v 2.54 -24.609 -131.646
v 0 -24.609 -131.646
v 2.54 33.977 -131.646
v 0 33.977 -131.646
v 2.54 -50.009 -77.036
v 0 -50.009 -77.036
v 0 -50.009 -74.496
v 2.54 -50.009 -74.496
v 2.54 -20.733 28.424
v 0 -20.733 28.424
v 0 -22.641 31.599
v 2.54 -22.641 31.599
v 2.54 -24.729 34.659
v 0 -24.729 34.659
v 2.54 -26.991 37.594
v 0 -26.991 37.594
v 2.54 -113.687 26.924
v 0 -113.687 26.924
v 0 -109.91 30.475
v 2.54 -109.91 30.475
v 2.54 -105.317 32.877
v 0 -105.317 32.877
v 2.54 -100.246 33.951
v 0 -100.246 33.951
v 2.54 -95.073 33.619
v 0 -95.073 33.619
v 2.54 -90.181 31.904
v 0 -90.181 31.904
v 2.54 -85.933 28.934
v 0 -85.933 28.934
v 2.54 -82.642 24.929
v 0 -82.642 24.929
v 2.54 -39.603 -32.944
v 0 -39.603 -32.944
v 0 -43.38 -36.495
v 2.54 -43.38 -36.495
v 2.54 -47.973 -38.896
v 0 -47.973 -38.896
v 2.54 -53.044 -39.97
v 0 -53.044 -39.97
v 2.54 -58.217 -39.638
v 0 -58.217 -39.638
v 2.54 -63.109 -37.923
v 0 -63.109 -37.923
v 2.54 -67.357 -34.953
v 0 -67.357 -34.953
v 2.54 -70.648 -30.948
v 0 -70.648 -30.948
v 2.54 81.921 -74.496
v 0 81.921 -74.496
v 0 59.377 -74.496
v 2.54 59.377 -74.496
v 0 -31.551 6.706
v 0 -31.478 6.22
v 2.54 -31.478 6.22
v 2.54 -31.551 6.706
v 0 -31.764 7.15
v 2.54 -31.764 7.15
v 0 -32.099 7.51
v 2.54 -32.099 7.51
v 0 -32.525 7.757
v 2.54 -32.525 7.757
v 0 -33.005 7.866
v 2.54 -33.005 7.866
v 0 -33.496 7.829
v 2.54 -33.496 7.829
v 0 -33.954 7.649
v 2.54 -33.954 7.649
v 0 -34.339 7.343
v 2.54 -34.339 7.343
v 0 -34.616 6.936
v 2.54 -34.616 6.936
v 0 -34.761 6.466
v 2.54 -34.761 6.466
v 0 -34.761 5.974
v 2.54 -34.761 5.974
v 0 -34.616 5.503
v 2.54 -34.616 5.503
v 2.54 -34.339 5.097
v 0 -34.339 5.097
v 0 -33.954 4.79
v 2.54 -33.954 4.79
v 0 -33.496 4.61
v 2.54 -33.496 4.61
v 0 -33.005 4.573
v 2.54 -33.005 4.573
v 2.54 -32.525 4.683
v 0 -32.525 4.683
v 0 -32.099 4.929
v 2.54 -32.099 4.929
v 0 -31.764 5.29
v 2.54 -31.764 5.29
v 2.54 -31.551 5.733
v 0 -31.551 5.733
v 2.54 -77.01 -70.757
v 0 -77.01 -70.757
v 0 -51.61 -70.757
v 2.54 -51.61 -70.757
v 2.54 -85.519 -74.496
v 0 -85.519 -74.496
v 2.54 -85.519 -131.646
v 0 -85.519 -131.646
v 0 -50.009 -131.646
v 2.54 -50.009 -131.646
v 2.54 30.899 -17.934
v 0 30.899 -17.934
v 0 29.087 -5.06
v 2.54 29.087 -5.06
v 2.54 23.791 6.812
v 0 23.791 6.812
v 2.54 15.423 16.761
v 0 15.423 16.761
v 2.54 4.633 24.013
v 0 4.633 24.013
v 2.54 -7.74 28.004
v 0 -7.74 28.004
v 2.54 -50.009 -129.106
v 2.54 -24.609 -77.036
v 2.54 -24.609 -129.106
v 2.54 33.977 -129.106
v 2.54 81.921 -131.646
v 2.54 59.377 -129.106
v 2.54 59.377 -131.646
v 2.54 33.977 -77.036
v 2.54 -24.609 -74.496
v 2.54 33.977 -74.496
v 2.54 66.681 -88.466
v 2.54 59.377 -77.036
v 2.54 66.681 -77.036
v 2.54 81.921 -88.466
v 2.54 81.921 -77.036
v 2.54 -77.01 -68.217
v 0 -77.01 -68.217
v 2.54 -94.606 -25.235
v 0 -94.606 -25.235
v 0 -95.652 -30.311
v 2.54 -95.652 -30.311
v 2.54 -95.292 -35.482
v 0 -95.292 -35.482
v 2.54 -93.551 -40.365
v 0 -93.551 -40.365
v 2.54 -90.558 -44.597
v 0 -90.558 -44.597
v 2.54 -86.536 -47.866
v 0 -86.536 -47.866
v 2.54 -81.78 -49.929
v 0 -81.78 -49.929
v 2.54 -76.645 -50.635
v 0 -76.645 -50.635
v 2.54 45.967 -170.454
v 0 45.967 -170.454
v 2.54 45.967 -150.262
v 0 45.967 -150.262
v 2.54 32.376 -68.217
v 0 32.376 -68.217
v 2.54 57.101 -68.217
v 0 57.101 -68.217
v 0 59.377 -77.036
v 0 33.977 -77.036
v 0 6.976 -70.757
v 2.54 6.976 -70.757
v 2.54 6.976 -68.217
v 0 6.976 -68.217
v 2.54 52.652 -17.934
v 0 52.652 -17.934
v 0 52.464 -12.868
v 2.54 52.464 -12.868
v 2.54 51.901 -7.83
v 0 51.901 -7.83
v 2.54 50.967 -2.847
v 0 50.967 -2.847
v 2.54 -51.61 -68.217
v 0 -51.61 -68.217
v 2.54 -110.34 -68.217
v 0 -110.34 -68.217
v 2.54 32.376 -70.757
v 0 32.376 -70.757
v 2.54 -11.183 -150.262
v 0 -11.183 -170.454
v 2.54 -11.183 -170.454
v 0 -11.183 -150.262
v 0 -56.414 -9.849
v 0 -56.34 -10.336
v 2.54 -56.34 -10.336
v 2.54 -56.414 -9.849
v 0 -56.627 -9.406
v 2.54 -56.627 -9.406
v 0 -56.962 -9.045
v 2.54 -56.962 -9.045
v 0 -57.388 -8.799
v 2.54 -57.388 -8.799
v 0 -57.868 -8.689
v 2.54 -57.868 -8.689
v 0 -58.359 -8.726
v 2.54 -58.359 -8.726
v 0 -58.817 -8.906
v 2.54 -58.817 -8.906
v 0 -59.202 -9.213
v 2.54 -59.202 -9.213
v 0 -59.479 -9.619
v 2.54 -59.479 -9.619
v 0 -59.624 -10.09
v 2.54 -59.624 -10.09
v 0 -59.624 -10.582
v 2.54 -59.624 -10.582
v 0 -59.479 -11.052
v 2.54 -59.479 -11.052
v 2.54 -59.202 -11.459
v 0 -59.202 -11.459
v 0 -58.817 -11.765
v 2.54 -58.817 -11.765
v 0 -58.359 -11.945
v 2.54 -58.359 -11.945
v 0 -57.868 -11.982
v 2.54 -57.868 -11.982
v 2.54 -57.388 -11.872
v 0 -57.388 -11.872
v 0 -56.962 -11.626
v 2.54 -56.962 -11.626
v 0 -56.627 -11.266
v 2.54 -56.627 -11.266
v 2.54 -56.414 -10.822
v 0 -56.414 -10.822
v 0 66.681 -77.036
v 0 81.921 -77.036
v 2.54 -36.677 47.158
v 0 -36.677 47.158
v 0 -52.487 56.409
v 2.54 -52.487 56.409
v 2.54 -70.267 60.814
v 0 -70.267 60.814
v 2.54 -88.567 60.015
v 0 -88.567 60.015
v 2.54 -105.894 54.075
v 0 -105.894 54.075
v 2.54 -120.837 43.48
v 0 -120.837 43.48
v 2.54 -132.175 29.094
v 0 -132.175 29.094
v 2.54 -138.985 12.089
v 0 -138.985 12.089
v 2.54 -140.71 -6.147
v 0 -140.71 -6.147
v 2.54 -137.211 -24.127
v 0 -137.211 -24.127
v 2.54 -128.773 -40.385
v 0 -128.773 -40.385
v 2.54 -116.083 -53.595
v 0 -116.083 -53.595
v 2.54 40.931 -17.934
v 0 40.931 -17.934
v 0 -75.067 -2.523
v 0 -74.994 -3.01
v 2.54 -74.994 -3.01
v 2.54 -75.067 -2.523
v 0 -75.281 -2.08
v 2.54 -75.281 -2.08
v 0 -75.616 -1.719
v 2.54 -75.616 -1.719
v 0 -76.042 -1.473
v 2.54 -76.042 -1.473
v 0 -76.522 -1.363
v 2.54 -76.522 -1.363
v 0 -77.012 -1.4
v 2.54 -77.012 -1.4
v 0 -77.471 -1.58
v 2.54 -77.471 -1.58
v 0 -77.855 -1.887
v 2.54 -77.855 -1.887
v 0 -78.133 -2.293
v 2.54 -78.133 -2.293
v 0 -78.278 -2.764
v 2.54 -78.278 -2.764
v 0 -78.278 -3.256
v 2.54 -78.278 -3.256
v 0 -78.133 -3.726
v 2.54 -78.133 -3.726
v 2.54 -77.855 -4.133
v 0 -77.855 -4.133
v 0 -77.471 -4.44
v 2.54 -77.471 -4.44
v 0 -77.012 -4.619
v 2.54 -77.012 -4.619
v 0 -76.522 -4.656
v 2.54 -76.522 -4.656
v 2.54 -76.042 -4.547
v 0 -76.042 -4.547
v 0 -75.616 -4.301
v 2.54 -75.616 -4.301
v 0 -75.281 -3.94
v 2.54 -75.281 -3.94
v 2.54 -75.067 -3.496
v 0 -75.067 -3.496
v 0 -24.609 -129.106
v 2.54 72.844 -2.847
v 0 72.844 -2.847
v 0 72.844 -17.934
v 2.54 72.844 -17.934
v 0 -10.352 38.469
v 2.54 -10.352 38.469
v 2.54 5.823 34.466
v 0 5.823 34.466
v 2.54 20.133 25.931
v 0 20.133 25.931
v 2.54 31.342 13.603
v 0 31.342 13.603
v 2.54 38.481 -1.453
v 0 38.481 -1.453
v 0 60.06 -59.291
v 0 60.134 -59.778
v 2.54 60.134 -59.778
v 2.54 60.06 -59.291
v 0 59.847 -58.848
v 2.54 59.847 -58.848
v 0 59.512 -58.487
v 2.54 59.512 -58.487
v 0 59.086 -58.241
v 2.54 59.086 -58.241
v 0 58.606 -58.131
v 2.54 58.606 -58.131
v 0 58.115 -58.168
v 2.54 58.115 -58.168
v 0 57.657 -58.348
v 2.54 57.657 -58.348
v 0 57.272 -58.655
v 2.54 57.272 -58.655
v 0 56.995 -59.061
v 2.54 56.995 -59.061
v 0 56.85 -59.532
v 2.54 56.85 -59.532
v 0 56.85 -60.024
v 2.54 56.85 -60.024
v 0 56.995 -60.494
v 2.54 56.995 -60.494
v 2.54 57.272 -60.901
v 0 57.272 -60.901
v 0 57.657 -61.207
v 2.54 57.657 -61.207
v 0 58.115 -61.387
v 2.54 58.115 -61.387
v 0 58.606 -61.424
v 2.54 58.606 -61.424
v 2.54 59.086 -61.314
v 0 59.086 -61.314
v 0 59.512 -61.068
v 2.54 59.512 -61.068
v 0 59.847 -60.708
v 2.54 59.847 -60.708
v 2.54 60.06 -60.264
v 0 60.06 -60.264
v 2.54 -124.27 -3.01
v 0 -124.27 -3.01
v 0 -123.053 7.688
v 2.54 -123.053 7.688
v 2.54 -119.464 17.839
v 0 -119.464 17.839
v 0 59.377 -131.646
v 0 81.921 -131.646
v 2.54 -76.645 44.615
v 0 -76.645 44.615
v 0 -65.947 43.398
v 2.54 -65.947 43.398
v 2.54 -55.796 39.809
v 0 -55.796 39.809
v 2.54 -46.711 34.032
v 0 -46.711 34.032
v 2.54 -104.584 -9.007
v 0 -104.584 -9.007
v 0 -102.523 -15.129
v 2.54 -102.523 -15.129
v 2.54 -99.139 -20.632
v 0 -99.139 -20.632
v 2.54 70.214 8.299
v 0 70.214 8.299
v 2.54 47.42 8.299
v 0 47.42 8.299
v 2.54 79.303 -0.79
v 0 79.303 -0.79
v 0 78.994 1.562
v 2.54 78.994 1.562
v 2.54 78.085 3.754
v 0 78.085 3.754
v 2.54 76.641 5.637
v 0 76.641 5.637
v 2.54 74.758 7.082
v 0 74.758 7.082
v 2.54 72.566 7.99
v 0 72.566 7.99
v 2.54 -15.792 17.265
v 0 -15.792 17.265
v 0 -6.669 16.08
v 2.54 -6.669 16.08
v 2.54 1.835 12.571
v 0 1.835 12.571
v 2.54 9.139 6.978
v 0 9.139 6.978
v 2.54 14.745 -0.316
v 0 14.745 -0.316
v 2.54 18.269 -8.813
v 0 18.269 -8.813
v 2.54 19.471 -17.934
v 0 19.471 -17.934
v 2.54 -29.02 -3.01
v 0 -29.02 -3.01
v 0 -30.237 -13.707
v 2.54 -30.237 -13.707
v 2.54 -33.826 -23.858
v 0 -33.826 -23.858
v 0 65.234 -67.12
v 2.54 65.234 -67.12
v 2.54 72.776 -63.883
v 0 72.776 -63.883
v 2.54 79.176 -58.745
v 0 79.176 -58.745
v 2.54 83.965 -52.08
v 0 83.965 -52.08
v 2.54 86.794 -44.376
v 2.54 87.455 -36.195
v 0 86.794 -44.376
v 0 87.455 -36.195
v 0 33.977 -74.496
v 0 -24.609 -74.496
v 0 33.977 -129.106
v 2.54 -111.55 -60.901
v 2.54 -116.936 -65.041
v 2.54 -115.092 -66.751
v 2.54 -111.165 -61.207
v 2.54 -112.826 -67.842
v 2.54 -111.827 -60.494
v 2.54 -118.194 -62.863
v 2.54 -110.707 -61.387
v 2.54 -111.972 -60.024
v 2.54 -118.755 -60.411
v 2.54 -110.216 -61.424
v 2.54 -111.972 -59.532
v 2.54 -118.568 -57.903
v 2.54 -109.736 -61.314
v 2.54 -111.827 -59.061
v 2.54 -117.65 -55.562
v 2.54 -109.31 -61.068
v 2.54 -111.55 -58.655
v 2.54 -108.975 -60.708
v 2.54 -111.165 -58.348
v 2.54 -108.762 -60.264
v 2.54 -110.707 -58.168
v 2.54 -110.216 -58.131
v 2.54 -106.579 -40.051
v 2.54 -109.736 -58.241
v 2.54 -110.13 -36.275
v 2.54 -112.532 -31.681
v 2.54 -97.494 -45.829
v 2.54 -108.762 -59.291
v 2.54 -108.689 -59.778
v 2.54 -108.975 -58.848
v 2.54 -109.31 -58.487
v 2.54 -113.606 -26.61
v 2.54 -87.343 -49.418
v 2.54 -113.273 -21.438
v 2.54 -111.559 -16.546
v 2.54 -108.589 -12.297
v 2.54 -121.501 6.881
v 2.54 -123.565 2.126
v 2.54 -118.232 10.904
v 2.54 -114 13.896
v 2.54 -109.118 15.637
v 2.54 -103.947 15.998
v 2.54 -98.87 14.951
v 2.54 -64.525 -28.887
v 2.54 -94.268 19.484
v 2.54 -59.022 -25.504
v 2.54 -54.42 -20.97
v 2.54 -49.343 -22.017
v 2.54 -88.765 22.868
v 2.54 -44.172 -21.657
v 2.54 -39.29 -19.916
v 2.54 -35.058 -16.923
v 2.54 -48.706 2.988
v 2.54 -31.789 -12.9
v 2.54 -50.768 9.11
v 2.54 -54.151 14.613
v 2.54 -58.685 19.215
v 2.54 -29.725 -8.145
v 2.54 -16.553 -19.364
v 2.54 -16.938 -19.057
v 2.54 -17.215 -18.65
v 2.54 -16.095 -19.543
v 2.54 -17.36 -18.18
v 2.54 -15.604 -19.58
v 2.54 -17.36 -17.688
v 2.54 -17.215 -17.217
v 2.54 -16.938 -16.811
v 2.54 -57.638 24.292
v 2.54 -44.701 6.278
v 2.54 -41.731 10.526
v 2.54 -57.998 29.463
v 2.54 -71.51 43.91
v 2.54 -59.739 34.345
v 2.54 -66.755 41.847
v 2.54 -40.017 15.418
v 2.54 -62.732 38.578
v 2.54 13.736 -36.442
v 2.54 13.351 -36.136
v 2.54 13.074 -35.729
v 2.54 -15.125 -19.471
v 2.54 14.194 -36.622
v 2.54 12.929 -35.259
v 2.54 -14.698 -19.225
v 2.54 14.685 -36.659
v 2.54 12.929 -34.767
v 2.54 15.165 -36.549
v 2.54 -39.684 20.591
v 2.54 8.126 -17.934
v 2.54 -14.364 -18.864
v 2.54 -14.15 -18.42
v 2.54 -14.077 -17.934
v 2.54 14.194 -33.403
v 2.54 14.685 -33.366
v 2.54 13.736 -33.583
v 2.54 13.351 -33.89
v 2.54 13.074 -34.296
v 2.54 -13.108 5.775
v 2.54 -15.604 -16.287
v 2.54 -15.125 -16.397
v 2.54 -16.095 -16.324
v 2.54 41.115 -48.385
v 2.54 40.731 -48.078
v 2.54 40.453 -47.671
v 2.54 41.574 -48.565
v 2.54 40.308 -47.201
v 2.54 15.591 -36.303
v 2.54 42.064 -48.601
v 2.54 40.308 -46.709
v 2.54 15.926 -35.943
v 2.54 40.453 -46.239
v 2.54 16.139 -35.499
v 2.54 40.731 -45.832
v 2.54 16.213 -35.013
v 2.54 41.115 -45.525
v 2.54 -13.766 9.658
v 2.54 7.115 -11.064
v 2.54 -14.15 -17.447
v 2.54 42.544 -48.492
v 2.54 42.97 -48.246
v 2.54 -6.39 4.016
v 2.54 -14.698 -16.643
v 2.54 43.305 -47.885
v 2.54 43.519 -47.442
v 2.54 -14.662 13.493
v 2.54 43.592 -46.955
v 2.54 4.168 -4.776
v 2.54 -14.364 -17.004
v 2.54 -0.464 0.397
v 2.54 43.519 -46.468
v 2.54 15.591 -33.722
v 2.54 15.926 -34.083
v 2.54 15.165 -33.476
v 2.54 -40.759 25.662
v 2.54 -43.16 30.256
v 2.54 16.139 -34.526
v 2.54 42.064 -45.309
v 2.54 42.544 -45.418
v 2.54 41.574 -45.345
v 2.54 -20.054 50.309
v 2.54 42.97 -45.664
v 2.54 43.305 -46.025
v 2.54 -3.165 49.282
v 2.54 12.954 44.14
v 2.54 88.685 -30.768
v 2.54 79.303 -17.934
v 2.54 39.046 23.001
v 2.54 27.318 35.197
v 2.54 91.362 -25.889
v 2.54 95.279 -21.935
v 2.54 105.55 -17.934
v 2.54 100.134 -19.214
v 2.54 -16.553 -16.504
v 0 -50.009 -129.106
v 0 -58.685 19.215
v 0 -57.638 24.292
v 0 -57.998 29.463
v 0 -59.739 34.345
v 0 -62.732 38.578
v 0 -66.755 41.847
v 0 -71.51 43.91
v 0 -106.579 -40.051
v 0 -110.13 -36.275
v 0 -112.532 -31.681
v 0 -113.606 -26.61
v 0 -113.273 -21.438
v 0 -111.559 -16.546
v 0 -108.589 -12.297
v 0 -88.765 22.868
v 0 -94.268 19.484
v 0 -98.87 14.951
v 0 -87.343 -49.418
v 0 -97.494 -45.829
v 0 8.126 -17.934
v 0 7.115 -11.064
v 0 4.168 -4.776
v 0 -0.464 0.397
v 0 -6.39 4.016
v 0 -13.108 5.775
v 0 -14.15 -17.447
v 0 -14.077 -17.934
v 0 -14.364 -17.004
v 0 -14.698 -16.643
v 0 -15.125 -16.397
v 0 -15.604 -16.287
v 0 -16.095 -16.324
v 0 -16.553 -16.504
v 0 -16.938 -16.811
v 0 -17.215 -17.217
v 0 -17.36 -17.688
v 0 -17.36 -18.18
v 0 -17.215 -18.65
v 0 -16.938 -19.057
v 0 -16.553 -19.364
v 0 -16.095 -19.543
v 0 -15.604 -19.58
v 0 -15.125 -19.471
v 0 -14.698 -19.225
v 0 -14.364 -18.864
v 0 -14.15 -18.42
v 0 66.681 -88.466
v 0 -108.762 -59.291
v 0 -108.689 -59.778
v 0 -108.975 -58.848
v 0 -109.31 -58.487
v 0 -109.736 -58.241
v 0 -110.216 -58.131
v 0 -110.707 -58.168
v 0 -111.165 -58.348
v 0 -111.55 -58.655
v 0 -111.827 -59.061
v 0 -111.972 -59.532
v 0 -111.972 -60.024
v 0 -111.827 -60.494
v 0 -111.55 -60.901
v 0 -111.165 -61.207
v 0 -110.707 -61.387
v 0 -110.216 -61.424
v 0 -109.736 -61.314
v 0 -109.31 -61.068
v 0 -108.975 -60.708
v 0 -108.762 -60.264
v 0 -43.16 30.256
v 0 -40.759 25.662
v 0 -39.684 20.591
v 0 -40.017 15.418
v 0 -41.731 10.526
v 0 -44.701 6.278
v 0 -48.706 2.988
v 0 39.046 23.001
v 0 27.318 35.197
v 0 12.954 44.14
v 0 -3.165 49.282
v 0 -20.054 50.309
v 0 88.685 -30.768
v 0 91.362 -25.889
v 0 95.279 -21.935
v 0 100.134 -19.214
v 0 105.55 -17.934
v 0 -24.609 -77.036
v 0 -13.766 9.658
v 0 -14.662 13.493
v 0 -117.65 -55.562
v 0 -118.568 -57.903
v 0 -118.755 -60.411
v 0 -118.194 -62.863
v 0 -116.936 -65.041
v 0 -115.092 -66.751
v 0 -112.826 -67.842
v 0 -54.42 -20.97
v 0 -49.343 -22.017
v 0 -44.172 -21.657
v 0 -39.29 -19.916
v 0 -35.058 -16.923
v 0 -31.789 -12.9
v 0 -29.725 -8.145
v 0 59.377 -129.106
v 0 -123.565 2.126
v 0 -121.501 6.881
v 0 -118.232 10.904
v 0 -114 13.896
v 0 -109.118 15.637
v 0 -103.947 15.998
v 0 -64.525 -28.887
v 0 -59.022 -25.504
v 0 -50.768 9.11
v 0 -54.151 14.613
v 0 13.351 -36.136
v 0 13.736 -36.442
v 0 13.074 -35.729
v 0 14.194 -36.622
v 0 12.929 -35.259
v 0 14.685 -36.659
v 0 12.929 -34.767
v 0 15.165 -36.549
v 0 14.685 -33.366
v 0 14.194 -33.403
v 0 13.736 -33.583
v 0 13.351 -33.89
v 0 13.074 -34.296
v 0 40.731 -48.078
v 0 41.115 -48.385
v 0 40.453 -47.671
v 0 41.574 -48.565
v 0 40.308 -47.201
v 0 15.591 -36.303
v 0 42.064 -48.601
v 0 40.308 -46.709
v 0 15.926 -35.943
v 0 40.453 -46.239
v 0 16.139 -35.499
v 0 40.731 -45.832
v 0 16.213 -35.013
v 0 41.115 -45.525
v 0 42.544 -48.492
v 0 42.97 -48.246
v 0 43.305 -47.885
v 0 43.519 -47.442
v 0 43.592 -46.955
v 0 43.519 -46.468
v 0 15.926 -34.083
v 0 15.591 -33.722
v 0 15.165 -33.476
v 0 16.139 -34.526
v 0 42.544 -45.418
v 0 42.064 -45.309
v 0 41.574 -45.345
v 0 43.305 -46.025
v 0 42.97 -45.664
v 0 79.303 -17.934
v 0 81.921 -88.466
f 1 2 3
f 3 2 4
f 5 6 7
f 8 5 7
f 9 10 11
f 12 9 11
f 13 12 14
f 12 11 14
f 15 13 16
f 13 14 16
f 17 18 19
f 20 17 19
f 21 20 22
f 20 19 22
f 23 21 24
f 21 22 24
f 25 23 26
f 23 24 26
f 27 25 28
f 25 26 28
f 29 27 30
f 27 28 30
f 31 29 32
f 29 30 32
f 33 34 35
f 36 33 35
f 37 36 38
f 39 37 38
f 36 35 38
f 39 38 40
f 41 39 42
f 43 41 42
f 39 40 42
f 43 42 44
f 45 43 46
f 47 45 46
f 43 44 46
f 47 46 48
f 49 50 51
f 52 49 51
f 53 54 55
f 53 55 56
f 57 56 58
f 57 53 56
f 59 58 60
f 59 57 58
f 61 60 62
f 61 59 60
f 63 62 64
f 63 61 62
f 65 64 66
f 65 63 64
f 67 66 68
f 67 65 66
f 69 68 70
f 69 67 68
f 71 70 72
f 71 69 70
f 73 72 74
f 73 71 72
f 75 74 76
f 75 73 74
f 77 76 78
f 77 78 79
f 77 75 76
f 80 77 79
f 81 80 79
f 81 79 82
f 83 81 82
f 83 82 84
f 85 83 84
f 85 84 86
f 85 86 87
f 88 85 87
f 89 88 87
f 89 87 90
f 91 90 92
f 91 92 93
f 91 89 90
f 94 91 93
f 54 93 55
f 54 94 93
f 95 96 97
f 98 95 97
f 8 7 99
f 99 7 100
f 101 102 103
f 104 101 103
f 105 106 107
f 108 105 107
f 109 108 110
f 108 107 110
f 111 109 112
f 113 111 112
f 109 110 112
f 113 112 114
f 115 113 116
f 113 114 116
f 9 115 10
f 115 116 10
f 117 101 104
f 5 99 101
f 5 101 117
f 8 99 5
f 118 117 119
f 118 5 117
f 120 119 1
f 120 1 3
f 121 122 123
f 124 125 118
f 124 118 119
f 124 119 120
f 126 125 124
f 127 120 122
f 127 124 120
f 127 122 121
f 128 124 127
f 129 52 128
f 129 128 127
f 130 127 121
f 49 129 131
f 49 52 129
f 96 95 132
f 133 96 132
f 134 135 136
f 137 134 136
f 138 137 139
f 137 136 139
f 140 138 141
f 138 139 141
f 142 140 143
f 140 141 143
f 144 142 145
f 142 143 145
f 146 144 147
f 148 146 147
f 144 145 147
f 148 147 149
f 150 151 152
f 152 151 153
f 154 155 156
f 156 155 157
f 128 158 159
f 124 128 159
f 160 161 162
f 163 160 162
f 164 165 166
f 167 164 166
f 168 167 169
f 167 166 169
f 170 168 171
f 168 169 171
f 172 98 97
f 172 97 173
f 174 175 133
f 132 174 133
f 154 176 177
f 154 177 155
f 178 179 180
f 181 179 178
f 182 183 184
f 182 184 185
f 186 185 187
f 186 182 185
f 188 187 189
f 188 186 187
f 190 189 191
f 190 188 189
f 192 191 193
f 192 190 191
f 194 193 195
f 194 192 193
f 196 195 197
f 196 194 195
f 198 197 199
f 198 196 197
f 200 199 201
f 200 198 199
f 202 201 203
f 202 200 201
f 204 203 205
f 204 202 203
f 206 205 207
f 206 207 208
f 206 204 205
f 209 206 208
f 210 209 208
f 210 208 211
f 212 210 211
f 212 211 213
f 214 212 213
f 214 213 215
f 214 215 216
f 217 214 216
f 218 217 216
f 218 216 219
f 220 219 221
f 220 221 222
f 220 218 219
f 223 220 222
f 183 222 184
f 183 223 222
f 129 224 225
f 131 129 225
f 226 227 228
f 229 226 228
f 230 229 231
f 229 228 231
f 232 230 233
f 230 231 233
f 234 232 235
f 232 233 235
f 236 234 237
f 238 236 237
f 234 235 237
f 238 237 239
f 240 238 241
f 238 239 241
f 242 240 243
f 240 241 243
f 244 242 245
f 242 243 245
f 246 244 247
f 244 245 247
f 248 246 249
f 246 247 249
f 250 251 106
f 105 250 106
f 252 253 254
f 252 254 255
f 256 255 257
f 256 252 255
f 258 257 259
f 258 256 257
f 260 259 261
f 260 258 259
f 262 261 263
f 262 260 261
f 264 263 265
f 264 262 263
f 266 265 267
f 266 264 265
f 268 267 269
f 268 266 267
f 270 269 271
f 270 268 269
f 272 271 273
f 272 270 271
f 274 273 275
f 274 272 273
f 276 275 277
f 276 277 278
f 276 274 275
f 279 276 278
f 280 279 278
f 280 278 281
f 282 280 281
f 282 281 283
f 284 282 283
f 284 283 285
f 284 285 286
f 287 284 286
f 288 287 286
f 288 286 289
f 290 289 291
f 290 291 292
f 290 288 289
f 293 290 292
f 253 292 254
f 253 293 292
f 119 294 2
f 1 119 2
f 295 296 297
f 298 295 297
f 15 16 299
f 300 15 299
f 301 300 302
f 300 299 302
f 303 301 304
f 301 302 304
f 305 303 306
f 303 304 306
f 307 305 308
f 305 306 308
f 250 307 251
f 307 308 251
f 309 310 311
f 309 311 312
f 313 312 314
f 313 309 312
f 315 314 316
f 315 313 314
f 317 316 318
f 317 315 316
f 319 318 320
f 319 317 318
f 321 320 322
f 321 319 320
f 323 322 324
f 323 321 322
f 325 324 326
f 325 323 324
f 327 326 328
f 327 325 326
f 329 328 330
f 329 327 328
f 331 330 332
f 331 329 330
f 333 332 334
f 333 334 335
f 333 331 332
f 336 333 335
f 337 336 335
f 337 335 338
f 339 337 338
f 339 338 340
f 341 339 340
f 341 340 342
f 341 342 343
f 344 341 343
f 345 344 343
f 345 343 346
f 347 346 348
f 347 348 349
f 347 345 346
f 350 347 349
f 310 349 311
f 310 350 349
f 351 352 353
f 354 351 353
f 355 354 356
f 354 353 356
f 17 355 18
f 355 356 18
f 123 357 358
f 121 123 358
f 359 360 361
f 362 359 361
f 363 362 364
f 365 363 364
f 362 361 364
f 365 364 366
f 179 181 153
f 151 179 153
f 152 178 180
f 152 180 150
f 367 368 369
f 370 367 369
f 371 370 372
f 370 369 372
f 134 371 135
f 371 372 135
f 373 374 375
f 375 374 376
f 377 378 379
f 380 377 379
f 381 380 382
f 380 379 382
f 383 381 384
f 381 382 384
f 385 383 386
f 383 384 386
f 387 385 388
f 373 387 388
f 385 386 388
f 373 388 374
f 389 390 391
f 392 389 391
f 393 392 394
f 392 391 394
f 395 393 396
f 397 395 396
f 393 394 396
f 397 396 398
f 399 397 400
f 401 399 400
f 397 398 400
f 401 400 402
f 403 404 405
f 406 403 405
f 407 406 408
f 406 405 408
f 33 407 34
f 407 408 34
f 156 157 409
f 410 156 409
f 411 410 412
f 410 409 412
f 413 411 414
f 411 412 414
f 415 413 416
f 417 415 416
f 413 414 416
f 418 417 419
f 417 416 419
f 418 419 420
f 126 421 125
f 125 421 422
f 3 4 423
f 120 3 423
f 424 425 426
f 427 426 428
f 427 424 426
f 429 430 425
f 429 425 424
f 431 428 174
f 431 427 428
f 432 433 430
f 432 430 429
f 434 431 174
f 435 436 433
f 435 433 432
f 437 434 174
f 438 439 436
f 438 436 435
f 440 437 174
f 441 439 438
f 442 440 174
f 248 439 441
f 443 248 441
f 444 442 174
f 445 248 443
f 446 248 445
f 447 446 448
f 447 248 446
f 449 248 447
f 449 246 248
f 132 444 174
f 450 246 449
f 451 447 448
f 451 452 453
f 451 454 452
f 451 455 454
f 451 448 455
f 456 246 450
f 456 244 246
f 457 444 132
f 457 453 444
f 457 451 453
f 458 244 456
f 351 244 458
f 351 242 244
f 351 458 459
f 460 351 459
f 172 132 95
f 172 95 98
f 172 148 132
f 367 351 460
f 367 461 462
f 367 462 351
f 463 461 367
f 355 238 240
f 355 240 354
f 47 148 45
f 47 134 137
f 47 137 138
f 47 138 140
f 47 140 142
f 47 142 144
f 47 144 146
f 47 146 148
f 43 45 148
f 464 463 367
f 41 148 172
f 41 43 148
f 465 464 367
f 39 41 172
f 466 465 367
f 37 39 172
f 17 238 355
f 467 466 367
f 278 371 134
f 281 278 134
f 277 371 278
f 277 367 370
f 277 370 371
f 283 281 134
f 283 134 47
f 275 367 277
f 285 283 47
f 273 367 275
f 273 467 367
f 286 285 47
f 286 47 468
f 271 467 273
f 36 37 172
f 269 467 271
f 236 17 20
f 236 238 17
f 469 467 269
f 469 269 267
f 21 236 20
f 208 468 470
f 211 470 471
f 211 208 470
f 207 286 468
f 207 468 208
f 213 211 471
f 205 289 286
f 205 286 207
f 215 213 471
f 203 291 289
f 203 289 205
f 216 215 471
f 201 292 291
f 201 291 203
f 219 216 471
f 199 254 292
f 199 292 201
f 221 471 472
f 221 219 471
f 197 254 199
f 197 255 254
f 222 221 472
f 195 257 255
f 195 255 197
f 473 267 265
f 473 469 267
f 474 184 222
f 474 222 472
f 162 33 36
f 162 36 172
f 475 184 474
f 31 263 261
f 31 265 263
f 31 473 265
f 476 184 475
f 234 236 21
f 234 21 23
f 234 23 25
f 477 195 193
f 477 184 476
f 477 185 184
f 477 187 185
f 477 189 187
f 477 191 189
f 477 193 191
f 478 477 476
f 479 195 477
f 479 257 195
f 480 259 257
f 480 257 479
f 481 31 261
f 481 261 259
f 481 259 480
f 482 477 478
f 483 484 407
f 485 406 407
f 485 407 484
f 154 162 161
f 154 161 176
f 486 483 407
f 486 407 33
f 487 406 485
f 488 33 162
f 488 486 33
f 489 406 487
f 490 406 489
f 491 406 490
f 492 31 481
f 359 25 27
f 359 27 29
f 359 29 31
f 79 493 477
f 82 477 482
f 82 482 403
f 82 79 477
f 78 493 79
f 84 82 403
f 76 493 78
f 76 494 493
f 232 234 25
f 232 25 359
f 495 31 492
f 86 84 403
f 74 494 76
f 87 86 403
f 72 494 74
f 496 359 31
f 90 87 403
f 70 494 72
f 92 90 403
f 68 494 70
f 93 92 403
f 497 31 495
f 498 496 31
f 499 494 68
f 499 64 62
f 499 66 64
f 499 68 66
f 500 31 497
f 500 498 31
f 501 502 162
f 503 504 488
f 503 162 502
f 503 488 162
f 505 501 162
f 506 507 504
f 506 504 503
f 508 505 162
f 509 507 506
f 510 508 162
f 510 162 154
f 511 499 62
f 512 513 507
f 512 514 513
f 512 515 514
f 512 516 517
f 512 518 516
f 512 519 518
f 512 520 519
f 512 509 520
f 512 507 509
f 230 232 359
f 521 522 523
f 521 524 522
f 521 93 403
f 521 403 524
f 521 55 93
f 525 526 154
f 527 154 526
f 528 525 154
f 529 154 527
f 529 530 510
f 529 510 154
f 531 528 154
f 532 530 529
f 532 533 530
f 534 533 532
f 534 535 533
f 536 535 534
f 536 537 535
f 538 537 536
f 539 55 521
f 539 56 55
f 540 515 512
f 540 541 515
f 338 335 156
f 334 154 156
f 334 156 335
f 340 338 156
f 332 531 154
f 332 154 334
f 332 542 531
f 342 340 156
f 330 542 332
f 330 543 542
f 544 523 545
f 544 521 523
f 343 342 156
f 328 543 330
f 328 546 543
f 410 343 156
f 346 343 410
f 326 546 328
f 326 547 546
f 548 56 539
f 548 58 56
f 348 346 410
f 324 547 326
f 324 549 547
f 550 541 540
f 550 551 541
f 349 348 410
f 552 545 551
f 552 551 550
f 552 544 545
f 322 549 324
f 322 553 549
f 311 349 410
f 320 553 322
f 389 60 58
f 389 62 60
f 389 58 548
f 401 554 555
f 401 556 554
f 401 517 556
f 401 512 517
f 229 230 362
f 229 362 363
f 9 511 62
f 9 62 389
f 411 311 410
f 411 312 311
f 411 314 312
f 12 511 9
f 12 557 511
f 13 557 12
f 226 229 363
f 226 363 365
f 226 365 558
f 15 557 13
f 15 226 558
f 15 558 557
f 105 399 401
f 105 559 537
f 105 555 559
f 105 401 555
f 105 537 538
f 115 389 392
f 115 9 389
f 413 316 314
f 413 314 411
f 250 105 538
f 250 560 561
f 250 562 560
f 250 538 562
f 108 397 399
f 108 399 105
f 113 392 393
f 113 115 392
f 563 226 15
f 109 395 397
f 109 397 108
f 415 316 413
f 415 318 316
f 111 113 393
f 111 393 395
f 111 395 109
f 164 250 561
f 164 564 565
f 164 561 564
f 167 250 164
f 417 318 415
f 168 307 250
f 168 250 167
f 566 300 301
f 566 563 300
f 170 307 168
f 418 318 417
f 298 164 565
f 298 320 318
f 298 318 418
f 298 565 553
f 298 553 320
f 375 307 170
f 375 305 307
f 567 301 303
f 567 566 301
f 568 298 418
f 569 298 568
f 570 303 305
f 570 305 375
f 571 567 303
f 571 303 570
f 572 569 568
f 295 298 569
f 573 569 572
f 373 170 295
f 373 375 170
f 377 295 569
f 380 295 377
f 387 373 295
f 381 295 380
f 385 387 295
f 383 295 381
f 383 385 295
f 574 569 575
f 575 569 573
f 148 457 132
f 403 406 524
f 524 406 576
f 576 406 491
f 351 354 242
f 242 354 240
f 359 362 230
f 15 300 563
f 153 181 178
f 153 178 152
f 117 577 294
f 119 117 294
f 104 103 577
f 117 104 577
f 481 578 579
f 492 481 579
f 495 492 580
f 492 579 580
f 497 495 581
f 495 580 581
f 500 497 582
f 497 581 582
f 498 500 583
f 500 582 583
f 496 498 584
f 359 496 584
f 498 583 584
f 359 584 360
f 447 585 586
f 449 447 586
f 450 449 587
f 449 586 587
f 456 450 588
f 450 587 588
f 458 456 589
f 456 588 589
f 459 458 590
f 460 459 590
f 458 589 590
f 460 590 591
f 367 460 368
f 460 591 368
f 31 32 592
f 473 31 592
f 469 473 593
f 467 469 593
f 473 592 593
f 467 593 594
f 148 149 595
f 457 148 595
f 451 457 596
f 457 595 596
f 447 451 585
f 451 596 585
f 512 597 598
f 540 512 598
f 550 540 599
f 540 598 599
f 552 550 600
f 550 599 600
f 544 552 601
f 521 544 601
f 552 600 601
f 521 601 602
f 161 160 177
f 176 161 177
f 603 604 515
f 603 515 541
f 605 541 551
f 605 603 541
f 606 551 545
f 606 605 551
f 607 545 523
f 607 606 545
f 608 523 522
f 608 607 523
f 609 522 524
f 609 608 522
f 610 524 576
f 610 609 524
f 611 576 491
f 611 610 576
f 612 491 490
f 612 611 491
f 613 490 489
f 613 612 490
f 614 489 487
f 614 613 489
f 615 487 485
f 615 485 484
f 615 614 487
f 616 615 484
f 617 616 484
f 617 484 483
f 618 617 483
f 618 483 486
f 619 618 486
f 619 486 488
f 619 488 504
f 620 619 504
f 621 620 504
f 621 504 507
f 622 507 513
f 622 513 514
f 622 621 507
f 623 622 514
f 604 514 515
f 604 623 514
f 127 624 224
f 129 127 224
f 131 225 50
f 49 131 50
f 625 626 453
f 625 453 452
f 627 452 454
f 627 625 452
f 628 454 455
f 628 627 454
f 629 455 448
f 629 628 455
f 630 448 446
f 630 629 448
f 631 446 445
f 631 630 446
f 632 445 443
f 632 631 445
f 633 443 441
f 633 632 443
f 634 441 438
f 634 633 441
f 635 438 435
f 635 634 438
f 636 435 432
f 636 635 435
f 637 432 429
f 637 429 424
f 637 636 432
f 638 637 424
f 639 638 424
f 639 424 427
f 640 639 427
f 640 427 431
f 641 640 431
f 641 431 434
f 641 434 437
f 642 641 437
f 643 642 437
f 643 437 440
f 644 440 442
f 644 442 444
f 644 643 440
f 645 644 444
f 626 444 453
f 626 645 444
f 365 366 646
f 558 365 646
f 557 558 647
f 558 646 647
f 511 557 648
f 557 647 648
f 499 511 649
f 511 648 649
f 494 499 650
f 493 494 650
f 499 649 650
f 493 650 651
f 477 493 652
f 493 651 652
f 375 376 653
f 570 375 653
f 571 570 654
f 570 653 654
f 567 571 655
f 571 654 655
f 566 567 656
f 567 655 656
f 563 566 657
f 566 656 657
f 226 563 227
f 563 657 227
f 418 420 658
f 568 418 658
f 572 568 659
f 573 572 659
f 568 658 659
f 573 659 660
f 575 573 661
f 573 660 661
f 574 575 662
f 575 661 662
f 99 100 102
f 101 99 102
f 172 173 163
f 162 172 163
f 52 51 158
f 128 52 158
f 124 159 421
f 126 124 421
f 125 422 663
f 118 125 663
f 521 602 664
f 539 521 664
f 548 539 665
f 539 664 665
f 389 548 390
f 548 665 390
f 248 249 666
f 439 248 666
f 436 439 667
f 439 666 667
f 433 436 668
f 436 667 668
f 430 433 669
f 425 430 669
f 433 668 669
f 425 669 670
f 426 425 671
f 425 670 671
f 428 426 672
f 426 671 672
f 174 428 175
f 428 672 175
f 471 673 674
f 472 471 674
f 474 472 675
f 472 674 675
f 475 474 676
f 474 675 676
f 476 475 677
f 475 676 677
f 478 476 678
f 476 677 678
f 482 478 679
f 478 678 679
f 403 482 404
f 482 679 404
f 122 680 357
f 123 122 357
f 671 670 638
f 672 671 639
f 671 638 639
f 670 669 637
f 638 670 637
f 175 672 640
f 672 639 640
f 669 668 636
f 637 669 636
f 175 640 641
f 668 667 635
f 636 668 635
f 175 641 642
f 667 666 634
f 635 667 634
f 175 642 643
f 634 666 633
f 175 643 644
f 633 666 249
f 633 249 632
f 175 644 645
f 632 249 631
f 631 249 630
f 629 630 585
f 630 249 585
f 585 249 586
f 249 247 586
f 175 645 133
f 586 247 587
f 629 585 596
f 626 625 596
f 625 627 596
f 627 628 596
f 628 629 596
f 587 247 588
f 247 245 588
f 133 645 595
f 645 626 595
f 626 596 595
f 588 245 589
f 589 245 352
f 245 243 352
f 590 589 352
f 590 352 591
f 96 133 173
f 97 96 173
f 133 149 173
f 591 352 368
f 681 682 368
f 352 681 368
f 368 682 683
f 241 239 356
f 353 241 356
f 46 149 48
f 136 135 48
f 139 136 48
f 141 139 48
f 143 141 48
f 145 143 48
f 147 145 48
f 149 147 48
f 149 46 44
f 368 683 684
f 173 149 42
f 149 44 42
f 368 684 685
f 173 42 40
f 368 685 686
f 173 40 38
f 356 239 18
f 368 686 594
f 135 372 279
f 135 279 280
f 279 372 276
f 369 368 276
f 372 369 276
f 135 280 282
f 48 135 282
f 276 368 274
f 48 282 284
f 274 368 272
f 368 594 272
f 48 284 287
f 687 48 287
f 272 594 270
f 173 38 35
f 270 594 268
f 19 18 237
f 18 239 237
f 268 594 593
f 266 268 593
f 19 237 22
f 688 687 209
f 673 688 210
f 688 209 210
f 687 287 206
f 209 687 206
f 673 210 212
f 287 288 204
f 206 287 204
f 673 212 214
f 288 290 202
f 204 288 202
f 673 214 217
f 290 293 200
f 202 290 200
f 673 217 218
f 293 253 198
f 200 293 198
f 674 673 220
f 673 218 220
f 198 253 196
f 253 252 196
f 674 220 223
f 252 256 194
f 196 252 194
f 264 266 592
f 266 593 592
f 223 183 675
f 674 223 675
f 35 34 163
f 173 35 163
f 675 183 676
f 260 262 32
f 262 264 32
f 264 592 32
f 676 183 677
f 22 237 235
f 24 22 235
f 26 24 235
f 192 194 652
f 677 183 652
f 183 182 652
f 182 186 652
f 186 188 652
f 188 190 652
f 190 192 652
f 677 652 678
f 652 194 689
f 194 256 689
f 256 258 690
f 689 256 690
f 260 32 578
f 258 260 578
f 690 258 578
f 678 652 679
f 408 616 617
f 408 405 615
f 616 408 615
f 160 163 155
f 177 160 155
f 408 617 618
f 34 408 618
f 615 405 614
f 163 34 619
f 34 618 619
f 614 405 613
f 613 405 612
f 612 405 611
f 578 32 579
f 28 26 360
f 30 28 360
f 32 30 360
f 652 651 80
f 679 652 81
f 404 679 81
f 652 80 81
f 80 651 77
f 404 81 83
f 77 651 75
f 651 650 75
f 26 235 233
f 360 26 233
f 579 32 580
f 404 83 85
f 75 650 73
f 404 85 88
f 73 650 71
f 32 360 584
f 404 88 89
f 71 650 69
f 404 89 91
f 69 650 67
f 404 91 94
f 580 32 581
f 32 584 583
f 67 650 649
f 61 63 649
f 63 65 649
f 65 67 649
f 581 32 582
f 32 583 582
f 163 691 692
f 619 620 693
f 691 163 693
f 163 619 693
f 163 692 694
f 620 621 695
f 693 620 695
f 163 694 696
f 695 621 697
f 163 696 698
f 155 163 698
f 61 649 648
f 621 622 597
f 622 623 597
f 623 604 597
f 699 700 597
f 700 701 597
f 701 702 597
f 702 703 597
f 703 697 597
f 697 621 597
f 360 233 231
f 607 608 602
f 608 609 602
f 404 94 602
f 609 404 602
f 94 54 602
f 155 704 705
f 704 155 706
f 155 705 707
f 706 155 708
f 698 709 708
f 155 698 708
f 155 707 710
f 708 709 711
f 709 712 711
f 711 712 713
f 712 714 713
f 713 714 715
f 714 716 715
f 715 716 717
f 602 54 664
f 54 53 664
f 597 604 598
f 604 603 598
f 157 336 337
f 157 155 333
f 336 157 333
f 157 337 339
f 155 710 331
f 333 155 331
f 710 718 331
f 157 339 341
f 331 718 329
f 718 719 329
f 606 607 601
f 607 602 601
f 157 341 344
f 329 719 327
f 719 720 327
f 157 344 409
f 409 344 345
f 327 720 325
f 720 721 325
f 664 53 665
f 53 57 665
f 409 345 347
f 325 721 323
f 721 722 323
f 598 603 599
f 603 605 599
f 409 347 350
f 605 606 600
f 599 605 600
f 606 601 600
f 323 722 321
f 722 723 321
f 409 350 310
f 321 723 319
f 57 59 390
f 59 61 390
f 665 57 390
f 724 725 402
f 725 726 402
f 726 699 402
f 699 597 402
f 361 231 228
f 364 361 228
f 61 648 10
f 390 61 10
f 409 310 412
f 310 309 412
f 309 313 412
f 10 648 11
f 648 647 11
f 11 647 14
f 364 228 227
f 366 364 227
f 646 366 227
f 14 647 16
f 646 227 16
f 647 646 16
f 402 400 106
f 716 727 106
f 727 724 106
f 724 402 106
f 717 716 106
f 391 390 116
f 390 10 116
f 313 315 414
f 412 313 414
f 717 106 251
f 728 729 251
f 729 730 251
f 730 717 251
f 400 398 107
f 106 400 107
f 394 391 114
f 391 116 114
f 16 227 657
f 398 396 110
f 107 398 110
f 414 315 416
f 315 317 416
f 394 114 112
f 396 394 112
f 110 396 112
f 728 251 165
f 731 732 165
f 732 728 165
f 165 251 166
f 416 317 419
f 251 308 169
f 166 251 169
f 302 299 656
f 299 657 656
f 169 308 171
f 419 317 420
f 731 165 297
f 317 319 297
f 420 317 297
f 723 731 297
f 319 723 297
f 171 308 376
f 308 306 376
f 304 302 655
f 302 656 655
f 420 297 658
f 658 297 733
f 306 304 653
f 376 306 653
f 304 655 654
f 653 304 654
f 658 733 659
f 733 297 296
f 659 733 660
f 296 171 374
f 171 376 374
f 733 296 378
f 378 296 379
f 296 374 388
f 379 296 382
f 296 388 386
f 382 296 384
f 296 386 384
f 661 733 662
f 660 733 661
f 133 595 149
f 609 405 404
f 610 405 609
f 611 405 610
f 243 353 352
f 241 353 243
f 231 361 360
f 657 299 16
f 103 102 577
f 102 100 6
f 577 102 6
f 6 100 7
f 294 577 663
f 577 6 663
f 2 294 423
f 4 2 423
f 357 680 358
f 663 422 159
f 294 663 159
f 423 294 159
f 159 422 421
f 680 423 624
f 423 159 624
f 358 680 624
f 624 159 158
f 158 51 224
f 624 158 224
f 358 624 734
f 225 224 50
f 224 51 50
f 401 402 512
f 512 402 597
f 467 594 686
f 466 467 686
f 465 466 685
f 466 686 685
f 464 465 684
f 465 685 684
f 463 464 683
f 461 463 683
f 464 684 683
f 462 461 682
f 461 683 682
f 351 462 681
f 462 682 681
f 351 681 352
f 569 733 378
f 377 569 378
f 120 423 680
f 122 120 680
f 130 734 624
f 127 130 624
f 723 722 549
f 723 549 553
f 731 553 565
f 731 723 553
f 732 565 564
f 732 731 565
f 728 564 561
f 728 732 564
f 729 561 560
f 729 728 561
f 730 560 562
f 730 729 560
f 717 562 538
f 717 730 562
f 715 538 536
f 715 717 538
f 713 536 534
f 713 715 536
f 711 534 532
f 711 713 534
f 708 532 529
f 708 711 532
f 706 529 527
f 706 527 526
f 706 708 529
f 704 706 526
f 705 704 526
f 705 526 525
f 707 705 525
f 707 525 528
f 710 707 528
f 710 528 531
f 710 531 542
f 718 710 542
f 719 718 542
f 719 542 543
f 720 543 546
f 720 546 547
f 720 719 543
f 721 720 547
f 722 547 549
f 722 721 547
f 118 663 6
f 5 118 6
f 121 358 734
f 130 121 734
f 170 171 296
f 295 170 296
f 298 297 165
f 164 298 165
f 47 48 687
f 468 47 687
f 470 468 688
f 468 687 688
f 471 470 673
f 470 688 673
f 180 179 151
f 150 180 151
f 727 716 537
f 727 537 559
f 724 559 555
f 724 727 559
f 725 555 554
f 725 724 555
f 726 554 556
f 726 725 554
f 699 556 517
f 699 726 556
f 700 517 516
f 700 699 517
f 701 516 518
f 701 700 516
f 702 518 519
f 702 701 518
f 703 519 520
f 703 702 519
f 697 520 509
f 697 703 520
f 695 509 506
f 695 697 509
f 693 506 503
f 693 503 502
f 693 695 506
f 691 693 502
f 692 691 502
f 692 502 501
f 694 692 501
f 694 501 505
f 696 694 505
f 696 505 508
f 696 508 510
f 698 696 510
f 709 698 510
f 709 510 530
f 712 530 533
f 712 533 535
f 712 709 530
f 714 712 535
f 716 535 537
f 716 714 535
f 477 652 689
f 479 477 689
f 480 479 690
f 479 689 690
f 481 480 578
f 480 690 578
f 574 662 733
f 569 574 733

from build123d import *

# Parameters (mm, degrees)
F0_R     = 1.651
F0_W     = 25.4
F0_H     = 2.54
F1_DEPTH = 2.54
F3_DEPTH = 2.54
F2_W     = 57.15
F2_H     = 20.1916538


# Not quite as in the source:
# - a feature names something its author has since deleted; it is built from what else it names


with BuildPart() as f1:
    # F0 (on Right) → F1 (new body)
    with BuildSketch(Plane.YZ):
        with BuildLine():
            Line((-110.3395098078, -68.216781003), (-77.0102134189, -68.216781003))
            Line((-77.0102134189, -68.216781003), (-51.6102134189, -68.216781003))
            Line((-51.6102134189, -68.216781003), (6.9758426398, -68.216781003))
            Line((6.9758426398, -68.216781003), (32.3758426398, -68.216781003))
            Line((32.3758426398, -68.216781003), (57.100551478, -68.216781003))
            ThreePointArc((57.100551478, -68.216781003), (79.1760571871, -58.7450905637), (87.4551682283, -36.1952082478))
            ThreePointArc((87.4551682283, -36.1952082478), (93.1827609105, -23.7752479136), (105.5495773538, -17.933794011))
            Line((105.5495773538, -17.933794011), (79.3032324412, -17.933794011))
            Line((79.3032324412, -17.933794011), (79.3032324412, -0.7903648026))
            ThreePointArc((79.3032324412, -0.7903648026), (76.6409185109, 5.6370295953), (70.2135241129, 8.2993435257))
            Line((70.2135241129, 8.2993435257), (47.4198818769, 8.2993435257))
            ThreePointArc((47.4198818769, 8.2993435257), (12.9543250307, 44.1398405436), (-36.6774012974, 47.1577167678))
            ThreePointArc((-36.6774012974, 47.1577167678), (-127.0218705021, 36.6937065388), (-116.0831372229, -53.5945138457))
            ThreePointArc((-116.0831372229, -53.5945138457), (-118.1944438098, -62.8630173745), (-110.3395098078, -68.216781003))
        make_face()
        with Locations((-110.3395098078, -59.7775988281)):
            Circle(F0_R, mode=Mode.SUBTRACT)
        with BuildLine():
            ThreePointArc((-106.5792463676, -40.0513765479), (-113.6163335987, -24.0126518115), (-104.5836338962, -9.0069321035))
            ThreePointArc((-104.5836338962, -9.0069321035), (-100.986725964, -17.9768034164), (-94.6055715395, -25.2347098813))
            ThreePointArc((-94.6055715395, -25.2347098813), (-92.199319164, -42.5832325093), (-76.6450592973, -50.6347098813))
            ThreePointArc((-76.6450592973, -50.6347098813), (-92.5200592973, -47.9109904866), (-106.5792463676, -40.0513765479))
        make_face(mode=Mode.SUBTRACT)
        with BuildLine():
            ThreePointArc((-70.6478370751, -30.9482844801), (-61.6779657622, -27.3513765479), (-54.4200592973, -20.9702221234))
            ThreePointArc((-54.4200592973, -20.9702221234), (-37.0715366693, -18.5639697479), (-29.0200592973, -3.0097098813))
            ThreePointArc((-29.0200592973, -3.0097098813), (-31.743778692, -18.8847098813), (-39.6033926307, -32.9438969515))
            ThreePointArc((-39.6033926307, -32.9438969515), (-55.6421173671, -39.9809841827), (-70.6478370751, -30.9482844801))
        make_face(mode=Mode.SUBTRACT)
        with Locations((-57.9914643632, -10.3356258236)):
            Circle(F0_R, mode=Mode.SUBTRACT)
        with Locations((41.94092891, -46.9549127524)):
            Circle(F0_R, mode=Mode.SUBTRACT)
        with Locations((58.4825998644, -59.7775988281)):
            Circle(F0_R, mode=Mode.SUBTRACT)
        with Locations((14.561701, -35.0126066428)):
            Circle(F0_R, mode=Mode.SUBTRACT)
        with Locations((-15.7277009394, -17.933794011)):
            Circle(F0_R, mode=Mode.SUBTRACT)
        with BuildLine():
            Line((72.8437239482, -17.933794011), (52.6520820419, -17.933794011))
            ThreePointArc((52.6520820419, -17.933794011), (52.2295051274, -10.343480173), (50.9669973093, -2.8469803618))
            Line((50.9669973093, -2.8469803618), (72.8437239482, -2.8469803618))
            Line((72.8437239482, -2.8469803618), (72.8437239482, -17.933794011))
        make_face(mode=Mode.SUBTRACT)
        with BuildLine():
            ThreePointArc((-124.2700592973, -3.0097098813), (-121.5463399027, 12.8652901187), (-113.686725964, 26.924477189))
            ThreePointArc((-113.686725964, 26.924477189), (-97.6480012275, 33.9615644202), (-82.6422815195, 24.9288647176))
            ThreePointArc((-82.6422815195, 24.9288647176), (-91.6121528324, 21.3319567854), (-98.8700592973, 14.9508023609))
            ThreePointArc((-98.8700592973, 14.9508023609), (-116.2185819254, 12.5445499854), (-124.2700592973, -3.0097098813))
        make_face(mode=Mode.SUBTRACT)
        with Locations((-76.6450592973, -3.0097098813)):
            Circle(F0_R, mode=Mode.SUBTRACT)
        with Locations((-33.1285902436, 6.2196841001)):
            Circle(F0_R, mode=Mode.SUBTRACT)
        with BuildLine():
            ThreePointArc((-46.7108722271, 34.0319567854), (-39.6737849959, 17.993232049), (-48.7064846984, 2.987512341))
            ThreePointArc((-48.7064846984, 2.987512341), (-52.3033926307, 11.9573836539), (-58.6845470552, 19.2152901187))
            ThreePointArc((-58.6845470552, 19.2152901187), (-61.0907994306, 36.5638127468), (-76.6450592973, 44.6152901187))
            ThreePointArc((-76.6450592973, 44.6152901187), (-60.7700592973, 41.8915707241), (-46.7108722271, 34.0319567854))
        make_face(mode=Mode.SUBTRACT)
        with BuildLine():
            ThreePointArc((8.1256330932, -17.933794011), (2.0413714041, -2.0202270784), (-13.1075925996, 5.7752037906))
            ThreePointArc((-13.1075925996, 5.7752037906), (-14.1849392561, 11.581992796), (-15.7918139924, 17.2650754062))
            ThreePointArc((-15.7918139924, 17.2650754062), (9.1390218846, 6.9782636063), (19.4712268672, -17.933794011))
            Line((19.4712268672, -17.933794011), (8.1256330932, -17.933794011))
        make_face(mode=Mode.SUBTRACT)
        with BuildLine():
            ThreePointArc((-26.9908731892, 37.5938144058), (20.1332877639, 25.9314979047), (40.9306995465, -17.933794011))
            Line((40.9306995465, -17.933794011), (30.8992126275, -17.933794011))
            ThreePointArc((30.8992126275, -17.933794011), (15.4225371964, 16.7610432542), (-20.7332734529, 28.4236575215))
            ThreePointArc((-20.7332734529, 28.4236575215), (-23.6633025042, 33.1443746694), (-26.9908731892, 37.5938144058))
        make_face(mode=Mode.SUBTRACT)
        with Locations((-64.3102134189, -69.486781003)):
            Rectangle(F0_W, F0_H)
        with Locations((19.6758426398, -69.486781003)):
            Rectangle(F0_W, F0_H)
    extrude(amount=F1_DEPTH)


with BuildPart() as f3:
    # F2 (on Right) → F3 (new body)
    with BuildSketch(Plane.YZ):
        Polygon((-50.0091612339, -74.4957265361), (-85.5189124058, -74.4957265361), (-85.5189124058, -131.6457265361), (-50.0091612339, -131.6457265361), (-50.0091612339, -129.1057265361), (-24.6091612339, -129.1057265361), (-24.6091612339, -131.6457265361), (33.9769039661, -131.6457265361), (33.9769039661, -129.1057265361), (59.3769039661, -129.1057265361), (59.3769039661, -131.6457265361), (81.9211387942, -131.6457265361), (81.9211387942, -88.4657265361), (66.6811387942, -88.4657265361), (66.6811387942, -77.0357265361), (81.9211387942, -77.0357265361), (81.9211387942, -74.4957265361), (59.3769039661, -74.4957265361), (59.3769039661, -77.0357265361), (33.9769039661, -77.0357265361), (33.9769039661, -74.4957265361), (-24.6091612339, -74.4957265361), (-24.6091612339, -77.0357265361), (-50.0091612339, -77.0357265361), align=None)
    extrude(amount=F3_DEPTH)


with BuildPart() as f3b:
    # F2 (on Right) → F3, piece 2 (new body)
    with BuildSketch(Plane.YZ):
        with Locations((17.3918033212, -160.3580791593)):
            Rectangle(F2_W, F2_H)
    extrude(amount=F3_DEPTH)


solid = Compound([f1.part, f3.part, f3b.part])
